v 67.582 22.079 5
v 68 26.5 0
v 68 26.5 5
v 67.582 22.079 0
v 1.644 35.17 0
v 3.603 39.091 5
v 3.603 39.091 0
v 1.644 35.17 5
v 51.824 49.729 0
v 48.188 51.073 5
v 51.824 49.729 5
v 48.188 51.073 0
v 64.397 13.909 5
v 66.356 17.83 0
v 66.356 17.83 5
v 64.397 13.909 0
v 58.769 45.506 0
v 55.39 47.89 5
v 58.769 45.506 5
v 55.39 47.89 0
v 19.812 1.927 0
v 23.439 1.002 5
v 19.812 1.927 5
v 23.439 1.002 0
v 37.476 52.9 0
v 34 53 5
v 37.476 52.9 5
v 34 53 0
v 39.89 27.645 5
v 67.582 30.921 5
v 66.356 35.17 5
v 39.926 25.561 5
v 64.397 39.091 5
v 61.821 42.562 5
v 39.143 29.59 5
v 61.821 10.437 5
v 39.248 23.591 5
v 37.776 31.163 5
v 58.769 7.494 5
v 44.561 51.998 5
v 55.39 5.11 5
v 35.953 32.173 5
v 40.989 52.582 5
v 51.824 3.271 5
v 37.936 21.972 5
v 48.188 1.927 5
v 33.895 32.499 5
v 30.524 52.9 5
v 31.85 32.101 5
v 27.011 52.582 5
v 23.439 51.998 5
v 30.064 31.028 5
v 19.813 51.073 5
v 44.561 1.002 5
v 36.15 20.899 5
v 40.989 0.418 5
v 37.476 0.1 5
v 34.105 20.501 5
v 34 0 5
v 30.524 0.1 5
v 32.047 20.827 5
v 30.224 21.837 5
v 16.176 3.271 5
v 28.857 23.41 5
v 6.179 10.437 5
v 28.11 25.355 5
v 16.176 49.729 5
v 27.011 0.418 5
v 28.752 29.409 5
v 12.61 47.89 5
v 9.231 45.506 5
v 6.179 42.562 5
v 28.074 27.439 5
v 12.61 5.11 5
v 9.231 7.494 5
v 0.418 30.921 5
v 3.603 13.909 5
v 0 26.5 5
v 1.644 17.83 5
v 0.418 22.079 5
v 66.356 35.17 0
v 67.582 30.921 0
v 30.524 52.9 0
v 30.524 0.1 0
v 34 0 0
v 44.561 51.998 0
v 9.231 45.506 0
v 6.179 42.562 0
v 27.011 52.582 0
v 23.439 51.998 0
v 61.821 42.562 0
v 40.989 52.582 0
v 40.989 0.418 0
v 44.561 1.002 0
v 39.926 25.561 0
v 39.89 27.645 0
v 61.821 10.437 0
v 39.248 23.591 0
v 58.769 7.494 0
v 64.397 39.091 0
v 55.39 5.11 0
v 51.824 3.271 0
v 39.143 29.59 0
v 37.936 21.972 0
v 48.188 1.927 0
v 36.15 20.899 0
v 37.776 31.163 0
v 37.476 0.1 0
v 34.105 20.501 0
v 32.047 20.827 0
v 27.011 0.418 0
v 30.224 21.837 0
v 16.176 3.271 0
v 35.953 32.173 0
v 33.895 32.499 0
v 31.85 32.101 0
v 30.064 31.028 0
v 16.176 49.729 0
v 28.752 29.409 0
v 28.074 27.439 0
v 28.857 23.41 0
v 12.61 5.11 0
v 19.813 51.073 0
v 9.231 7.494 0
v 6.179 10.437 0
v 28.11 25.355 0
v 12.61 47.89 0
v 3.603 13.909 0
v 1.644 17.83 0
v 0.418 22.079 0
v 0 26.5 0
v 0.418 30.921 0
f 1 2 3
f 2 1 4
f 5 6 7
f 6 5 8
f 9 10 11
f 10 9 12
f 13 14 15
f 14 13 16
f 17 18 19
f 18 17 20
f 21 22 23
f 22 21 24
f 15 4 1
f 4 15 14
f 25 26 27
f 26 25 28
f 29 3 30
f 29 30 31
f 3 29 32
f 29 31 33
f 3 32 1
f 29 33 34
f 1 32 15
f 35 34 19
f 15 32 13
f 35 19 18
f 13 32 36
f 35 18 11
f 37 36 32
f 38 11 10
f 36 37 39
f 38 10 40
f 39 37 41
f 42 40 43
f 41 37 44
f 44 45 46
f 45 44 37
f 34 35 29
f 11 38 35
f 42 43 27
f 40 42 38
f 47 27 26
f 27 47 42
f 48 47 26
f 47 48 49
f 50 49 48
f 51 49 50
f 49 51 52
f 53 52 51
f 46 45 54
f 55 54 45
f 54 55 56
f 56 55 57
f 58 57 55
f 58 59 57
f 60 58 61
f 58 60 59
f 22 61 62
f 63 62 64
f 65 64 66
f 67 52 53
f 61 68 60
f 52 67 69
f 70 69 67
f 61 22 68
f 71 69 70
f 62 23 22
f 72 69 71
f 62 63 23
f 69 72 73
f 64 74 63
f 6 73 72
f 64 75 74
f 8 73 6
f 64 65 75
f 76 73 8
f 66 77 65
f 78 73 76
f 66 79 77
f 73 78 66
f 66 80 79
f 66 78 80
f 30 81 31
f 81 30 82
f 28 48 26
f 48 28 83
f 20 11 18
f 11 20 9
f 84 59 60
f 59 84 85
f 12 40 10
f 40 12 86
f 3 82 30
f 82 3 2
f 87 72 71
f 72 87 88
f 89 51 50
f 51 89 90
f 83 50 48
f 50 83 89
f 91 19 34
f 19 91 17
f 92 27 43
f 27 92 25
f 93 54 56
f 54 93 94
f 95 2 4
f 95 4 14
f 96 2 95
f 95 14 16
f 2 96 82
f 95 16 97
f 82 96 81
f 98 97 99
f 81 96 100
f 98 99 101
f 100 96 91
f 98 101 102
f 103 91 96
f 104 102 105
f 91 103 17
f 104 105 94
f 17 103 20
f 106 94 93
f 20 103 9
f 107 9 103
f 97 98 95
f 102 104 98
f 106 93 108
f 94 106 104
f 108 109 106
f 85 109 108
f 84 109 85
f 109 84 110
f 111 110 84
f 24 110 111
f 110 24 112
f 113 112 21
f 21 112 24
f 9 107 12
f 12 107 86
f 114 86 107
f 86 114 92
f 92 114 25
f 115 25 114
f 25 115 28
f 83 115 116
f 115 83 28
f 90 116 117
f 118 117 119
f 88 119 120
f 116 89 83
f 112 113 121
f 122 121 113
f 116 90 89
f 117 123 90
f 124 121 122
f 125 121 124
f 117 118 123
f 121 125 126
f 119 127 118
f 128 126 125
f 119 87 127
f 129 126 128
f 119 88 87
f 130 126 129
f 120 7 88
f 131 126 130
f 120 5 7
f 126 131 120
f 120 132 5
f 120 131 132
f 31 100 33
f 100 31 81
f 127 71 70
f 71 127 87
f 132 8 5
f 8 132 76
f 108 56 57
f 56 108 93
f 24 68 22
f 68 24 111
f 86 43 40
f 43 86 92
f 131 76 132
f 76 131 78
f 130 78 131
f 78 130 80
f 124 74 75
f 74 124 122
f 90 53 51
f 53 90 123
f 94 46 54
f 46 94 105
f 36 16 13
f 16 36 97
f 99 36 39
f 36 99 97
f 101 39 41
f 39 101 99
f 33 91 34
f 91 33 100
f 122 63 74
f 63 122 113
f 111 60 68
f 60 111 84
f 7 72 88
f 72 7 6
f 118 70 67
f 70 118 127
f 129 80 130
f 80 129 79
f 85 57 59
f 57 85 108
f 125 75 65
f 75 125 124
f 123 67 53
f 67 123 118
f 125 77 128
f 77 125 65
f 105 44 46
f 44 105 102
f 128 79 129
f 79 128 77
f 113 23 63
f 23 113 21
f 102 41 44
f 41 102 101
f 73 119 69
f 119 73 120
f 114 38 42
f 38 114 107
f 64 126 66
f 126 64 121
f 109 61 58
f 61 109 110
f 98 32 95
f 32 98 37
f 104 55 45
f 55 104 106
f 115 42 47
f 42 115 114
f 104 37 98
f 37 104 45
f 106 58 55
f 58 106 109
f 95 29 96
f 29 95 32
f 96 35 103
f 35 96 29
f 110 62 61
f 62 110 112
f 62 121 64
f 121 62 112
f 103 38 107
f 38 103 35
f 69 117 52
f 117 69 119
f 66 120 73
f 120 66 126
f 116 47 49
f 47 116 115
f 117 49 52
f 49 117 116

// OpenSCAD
$fn = 32;

// ----------------------------------------------------------------------
// Cam plate: double_lobe cam, base R24
// ----------------------------------------------------------------------

// --- parameters (mm) ---
base_r = 24;              // base circle radius
lobe_h = 10;              // cam lobe rise
bore_r = 6;               // shaft bore radius
plate_t = 5;              // plate thickness, Z (extrusion height)

profile = [[68, 26.5], [67.582, 30.921], [66.356, 35.17], [64.397, 39.091], [61.821, 42.562], [58.769, 45.506], [55.39, 47.89], [51.824, 49.729], [48.188, 51.073], [44.561, 51.998], [40.989, 52.582], [37.476, 52.9], [34, 53], [30.524, 52.9], [27.011, 52.582], [23.439, 51.998], [19.813, 51.073], [16.176, 49.729], [12.61, 47.89], [9.231, 45.506], [6.179, 42.562], [3.603, 39.091], [1.644, 35.17], [0.418, 30.921], [0, 26.5], [0.418, 22.079], [1.644, 17.83], [3.603, 13.909], [6.179, 10.437], [9.231, 7.494], [12.61, 5.11], [16.176, 3.271], [19.812, 1.927], [23.439, 1.002], [27.011, 0.418], [30.524, 0.1], [34, 0], [37.476, 0.1], [40.989, 0.418], [44.561, 1.002], [48.188, 1.927], [51.824, 3.271], [55.39, 5.11], [58.769, 7.494], [61.821, 10.437], [64.397, 13.909], [66.356, 17.83], [67.582, 22.079]];  // primary outline, 48 points, counter clockwise
void_1 = [[39.89, 27.645], [39.143, 29.59], [37.776, 31.163], [35.953, 32.173], [33.895, 32.499], [31.85, 32.101], [30.064, 31.028], [28.752, 29.409], [28.074, 27.439], [28.11, 25.355], [28.857, 23.41], [30.224, 21.837], [32.047, 20.827], [34.105, 20.501], [36.15, 20.899], [37.936, 21.972], [39.248, 23.591], [39.926, 25.561]];  // shaft bore, 18 points

// --- the one profile operation ---
difference() {
  linear_extrude(height = plate_t) polygon(points = profile);
  translate([0, 0, -1])
    linear_extrude(height = plate_t + 2) polygon(points = void_1);
}
